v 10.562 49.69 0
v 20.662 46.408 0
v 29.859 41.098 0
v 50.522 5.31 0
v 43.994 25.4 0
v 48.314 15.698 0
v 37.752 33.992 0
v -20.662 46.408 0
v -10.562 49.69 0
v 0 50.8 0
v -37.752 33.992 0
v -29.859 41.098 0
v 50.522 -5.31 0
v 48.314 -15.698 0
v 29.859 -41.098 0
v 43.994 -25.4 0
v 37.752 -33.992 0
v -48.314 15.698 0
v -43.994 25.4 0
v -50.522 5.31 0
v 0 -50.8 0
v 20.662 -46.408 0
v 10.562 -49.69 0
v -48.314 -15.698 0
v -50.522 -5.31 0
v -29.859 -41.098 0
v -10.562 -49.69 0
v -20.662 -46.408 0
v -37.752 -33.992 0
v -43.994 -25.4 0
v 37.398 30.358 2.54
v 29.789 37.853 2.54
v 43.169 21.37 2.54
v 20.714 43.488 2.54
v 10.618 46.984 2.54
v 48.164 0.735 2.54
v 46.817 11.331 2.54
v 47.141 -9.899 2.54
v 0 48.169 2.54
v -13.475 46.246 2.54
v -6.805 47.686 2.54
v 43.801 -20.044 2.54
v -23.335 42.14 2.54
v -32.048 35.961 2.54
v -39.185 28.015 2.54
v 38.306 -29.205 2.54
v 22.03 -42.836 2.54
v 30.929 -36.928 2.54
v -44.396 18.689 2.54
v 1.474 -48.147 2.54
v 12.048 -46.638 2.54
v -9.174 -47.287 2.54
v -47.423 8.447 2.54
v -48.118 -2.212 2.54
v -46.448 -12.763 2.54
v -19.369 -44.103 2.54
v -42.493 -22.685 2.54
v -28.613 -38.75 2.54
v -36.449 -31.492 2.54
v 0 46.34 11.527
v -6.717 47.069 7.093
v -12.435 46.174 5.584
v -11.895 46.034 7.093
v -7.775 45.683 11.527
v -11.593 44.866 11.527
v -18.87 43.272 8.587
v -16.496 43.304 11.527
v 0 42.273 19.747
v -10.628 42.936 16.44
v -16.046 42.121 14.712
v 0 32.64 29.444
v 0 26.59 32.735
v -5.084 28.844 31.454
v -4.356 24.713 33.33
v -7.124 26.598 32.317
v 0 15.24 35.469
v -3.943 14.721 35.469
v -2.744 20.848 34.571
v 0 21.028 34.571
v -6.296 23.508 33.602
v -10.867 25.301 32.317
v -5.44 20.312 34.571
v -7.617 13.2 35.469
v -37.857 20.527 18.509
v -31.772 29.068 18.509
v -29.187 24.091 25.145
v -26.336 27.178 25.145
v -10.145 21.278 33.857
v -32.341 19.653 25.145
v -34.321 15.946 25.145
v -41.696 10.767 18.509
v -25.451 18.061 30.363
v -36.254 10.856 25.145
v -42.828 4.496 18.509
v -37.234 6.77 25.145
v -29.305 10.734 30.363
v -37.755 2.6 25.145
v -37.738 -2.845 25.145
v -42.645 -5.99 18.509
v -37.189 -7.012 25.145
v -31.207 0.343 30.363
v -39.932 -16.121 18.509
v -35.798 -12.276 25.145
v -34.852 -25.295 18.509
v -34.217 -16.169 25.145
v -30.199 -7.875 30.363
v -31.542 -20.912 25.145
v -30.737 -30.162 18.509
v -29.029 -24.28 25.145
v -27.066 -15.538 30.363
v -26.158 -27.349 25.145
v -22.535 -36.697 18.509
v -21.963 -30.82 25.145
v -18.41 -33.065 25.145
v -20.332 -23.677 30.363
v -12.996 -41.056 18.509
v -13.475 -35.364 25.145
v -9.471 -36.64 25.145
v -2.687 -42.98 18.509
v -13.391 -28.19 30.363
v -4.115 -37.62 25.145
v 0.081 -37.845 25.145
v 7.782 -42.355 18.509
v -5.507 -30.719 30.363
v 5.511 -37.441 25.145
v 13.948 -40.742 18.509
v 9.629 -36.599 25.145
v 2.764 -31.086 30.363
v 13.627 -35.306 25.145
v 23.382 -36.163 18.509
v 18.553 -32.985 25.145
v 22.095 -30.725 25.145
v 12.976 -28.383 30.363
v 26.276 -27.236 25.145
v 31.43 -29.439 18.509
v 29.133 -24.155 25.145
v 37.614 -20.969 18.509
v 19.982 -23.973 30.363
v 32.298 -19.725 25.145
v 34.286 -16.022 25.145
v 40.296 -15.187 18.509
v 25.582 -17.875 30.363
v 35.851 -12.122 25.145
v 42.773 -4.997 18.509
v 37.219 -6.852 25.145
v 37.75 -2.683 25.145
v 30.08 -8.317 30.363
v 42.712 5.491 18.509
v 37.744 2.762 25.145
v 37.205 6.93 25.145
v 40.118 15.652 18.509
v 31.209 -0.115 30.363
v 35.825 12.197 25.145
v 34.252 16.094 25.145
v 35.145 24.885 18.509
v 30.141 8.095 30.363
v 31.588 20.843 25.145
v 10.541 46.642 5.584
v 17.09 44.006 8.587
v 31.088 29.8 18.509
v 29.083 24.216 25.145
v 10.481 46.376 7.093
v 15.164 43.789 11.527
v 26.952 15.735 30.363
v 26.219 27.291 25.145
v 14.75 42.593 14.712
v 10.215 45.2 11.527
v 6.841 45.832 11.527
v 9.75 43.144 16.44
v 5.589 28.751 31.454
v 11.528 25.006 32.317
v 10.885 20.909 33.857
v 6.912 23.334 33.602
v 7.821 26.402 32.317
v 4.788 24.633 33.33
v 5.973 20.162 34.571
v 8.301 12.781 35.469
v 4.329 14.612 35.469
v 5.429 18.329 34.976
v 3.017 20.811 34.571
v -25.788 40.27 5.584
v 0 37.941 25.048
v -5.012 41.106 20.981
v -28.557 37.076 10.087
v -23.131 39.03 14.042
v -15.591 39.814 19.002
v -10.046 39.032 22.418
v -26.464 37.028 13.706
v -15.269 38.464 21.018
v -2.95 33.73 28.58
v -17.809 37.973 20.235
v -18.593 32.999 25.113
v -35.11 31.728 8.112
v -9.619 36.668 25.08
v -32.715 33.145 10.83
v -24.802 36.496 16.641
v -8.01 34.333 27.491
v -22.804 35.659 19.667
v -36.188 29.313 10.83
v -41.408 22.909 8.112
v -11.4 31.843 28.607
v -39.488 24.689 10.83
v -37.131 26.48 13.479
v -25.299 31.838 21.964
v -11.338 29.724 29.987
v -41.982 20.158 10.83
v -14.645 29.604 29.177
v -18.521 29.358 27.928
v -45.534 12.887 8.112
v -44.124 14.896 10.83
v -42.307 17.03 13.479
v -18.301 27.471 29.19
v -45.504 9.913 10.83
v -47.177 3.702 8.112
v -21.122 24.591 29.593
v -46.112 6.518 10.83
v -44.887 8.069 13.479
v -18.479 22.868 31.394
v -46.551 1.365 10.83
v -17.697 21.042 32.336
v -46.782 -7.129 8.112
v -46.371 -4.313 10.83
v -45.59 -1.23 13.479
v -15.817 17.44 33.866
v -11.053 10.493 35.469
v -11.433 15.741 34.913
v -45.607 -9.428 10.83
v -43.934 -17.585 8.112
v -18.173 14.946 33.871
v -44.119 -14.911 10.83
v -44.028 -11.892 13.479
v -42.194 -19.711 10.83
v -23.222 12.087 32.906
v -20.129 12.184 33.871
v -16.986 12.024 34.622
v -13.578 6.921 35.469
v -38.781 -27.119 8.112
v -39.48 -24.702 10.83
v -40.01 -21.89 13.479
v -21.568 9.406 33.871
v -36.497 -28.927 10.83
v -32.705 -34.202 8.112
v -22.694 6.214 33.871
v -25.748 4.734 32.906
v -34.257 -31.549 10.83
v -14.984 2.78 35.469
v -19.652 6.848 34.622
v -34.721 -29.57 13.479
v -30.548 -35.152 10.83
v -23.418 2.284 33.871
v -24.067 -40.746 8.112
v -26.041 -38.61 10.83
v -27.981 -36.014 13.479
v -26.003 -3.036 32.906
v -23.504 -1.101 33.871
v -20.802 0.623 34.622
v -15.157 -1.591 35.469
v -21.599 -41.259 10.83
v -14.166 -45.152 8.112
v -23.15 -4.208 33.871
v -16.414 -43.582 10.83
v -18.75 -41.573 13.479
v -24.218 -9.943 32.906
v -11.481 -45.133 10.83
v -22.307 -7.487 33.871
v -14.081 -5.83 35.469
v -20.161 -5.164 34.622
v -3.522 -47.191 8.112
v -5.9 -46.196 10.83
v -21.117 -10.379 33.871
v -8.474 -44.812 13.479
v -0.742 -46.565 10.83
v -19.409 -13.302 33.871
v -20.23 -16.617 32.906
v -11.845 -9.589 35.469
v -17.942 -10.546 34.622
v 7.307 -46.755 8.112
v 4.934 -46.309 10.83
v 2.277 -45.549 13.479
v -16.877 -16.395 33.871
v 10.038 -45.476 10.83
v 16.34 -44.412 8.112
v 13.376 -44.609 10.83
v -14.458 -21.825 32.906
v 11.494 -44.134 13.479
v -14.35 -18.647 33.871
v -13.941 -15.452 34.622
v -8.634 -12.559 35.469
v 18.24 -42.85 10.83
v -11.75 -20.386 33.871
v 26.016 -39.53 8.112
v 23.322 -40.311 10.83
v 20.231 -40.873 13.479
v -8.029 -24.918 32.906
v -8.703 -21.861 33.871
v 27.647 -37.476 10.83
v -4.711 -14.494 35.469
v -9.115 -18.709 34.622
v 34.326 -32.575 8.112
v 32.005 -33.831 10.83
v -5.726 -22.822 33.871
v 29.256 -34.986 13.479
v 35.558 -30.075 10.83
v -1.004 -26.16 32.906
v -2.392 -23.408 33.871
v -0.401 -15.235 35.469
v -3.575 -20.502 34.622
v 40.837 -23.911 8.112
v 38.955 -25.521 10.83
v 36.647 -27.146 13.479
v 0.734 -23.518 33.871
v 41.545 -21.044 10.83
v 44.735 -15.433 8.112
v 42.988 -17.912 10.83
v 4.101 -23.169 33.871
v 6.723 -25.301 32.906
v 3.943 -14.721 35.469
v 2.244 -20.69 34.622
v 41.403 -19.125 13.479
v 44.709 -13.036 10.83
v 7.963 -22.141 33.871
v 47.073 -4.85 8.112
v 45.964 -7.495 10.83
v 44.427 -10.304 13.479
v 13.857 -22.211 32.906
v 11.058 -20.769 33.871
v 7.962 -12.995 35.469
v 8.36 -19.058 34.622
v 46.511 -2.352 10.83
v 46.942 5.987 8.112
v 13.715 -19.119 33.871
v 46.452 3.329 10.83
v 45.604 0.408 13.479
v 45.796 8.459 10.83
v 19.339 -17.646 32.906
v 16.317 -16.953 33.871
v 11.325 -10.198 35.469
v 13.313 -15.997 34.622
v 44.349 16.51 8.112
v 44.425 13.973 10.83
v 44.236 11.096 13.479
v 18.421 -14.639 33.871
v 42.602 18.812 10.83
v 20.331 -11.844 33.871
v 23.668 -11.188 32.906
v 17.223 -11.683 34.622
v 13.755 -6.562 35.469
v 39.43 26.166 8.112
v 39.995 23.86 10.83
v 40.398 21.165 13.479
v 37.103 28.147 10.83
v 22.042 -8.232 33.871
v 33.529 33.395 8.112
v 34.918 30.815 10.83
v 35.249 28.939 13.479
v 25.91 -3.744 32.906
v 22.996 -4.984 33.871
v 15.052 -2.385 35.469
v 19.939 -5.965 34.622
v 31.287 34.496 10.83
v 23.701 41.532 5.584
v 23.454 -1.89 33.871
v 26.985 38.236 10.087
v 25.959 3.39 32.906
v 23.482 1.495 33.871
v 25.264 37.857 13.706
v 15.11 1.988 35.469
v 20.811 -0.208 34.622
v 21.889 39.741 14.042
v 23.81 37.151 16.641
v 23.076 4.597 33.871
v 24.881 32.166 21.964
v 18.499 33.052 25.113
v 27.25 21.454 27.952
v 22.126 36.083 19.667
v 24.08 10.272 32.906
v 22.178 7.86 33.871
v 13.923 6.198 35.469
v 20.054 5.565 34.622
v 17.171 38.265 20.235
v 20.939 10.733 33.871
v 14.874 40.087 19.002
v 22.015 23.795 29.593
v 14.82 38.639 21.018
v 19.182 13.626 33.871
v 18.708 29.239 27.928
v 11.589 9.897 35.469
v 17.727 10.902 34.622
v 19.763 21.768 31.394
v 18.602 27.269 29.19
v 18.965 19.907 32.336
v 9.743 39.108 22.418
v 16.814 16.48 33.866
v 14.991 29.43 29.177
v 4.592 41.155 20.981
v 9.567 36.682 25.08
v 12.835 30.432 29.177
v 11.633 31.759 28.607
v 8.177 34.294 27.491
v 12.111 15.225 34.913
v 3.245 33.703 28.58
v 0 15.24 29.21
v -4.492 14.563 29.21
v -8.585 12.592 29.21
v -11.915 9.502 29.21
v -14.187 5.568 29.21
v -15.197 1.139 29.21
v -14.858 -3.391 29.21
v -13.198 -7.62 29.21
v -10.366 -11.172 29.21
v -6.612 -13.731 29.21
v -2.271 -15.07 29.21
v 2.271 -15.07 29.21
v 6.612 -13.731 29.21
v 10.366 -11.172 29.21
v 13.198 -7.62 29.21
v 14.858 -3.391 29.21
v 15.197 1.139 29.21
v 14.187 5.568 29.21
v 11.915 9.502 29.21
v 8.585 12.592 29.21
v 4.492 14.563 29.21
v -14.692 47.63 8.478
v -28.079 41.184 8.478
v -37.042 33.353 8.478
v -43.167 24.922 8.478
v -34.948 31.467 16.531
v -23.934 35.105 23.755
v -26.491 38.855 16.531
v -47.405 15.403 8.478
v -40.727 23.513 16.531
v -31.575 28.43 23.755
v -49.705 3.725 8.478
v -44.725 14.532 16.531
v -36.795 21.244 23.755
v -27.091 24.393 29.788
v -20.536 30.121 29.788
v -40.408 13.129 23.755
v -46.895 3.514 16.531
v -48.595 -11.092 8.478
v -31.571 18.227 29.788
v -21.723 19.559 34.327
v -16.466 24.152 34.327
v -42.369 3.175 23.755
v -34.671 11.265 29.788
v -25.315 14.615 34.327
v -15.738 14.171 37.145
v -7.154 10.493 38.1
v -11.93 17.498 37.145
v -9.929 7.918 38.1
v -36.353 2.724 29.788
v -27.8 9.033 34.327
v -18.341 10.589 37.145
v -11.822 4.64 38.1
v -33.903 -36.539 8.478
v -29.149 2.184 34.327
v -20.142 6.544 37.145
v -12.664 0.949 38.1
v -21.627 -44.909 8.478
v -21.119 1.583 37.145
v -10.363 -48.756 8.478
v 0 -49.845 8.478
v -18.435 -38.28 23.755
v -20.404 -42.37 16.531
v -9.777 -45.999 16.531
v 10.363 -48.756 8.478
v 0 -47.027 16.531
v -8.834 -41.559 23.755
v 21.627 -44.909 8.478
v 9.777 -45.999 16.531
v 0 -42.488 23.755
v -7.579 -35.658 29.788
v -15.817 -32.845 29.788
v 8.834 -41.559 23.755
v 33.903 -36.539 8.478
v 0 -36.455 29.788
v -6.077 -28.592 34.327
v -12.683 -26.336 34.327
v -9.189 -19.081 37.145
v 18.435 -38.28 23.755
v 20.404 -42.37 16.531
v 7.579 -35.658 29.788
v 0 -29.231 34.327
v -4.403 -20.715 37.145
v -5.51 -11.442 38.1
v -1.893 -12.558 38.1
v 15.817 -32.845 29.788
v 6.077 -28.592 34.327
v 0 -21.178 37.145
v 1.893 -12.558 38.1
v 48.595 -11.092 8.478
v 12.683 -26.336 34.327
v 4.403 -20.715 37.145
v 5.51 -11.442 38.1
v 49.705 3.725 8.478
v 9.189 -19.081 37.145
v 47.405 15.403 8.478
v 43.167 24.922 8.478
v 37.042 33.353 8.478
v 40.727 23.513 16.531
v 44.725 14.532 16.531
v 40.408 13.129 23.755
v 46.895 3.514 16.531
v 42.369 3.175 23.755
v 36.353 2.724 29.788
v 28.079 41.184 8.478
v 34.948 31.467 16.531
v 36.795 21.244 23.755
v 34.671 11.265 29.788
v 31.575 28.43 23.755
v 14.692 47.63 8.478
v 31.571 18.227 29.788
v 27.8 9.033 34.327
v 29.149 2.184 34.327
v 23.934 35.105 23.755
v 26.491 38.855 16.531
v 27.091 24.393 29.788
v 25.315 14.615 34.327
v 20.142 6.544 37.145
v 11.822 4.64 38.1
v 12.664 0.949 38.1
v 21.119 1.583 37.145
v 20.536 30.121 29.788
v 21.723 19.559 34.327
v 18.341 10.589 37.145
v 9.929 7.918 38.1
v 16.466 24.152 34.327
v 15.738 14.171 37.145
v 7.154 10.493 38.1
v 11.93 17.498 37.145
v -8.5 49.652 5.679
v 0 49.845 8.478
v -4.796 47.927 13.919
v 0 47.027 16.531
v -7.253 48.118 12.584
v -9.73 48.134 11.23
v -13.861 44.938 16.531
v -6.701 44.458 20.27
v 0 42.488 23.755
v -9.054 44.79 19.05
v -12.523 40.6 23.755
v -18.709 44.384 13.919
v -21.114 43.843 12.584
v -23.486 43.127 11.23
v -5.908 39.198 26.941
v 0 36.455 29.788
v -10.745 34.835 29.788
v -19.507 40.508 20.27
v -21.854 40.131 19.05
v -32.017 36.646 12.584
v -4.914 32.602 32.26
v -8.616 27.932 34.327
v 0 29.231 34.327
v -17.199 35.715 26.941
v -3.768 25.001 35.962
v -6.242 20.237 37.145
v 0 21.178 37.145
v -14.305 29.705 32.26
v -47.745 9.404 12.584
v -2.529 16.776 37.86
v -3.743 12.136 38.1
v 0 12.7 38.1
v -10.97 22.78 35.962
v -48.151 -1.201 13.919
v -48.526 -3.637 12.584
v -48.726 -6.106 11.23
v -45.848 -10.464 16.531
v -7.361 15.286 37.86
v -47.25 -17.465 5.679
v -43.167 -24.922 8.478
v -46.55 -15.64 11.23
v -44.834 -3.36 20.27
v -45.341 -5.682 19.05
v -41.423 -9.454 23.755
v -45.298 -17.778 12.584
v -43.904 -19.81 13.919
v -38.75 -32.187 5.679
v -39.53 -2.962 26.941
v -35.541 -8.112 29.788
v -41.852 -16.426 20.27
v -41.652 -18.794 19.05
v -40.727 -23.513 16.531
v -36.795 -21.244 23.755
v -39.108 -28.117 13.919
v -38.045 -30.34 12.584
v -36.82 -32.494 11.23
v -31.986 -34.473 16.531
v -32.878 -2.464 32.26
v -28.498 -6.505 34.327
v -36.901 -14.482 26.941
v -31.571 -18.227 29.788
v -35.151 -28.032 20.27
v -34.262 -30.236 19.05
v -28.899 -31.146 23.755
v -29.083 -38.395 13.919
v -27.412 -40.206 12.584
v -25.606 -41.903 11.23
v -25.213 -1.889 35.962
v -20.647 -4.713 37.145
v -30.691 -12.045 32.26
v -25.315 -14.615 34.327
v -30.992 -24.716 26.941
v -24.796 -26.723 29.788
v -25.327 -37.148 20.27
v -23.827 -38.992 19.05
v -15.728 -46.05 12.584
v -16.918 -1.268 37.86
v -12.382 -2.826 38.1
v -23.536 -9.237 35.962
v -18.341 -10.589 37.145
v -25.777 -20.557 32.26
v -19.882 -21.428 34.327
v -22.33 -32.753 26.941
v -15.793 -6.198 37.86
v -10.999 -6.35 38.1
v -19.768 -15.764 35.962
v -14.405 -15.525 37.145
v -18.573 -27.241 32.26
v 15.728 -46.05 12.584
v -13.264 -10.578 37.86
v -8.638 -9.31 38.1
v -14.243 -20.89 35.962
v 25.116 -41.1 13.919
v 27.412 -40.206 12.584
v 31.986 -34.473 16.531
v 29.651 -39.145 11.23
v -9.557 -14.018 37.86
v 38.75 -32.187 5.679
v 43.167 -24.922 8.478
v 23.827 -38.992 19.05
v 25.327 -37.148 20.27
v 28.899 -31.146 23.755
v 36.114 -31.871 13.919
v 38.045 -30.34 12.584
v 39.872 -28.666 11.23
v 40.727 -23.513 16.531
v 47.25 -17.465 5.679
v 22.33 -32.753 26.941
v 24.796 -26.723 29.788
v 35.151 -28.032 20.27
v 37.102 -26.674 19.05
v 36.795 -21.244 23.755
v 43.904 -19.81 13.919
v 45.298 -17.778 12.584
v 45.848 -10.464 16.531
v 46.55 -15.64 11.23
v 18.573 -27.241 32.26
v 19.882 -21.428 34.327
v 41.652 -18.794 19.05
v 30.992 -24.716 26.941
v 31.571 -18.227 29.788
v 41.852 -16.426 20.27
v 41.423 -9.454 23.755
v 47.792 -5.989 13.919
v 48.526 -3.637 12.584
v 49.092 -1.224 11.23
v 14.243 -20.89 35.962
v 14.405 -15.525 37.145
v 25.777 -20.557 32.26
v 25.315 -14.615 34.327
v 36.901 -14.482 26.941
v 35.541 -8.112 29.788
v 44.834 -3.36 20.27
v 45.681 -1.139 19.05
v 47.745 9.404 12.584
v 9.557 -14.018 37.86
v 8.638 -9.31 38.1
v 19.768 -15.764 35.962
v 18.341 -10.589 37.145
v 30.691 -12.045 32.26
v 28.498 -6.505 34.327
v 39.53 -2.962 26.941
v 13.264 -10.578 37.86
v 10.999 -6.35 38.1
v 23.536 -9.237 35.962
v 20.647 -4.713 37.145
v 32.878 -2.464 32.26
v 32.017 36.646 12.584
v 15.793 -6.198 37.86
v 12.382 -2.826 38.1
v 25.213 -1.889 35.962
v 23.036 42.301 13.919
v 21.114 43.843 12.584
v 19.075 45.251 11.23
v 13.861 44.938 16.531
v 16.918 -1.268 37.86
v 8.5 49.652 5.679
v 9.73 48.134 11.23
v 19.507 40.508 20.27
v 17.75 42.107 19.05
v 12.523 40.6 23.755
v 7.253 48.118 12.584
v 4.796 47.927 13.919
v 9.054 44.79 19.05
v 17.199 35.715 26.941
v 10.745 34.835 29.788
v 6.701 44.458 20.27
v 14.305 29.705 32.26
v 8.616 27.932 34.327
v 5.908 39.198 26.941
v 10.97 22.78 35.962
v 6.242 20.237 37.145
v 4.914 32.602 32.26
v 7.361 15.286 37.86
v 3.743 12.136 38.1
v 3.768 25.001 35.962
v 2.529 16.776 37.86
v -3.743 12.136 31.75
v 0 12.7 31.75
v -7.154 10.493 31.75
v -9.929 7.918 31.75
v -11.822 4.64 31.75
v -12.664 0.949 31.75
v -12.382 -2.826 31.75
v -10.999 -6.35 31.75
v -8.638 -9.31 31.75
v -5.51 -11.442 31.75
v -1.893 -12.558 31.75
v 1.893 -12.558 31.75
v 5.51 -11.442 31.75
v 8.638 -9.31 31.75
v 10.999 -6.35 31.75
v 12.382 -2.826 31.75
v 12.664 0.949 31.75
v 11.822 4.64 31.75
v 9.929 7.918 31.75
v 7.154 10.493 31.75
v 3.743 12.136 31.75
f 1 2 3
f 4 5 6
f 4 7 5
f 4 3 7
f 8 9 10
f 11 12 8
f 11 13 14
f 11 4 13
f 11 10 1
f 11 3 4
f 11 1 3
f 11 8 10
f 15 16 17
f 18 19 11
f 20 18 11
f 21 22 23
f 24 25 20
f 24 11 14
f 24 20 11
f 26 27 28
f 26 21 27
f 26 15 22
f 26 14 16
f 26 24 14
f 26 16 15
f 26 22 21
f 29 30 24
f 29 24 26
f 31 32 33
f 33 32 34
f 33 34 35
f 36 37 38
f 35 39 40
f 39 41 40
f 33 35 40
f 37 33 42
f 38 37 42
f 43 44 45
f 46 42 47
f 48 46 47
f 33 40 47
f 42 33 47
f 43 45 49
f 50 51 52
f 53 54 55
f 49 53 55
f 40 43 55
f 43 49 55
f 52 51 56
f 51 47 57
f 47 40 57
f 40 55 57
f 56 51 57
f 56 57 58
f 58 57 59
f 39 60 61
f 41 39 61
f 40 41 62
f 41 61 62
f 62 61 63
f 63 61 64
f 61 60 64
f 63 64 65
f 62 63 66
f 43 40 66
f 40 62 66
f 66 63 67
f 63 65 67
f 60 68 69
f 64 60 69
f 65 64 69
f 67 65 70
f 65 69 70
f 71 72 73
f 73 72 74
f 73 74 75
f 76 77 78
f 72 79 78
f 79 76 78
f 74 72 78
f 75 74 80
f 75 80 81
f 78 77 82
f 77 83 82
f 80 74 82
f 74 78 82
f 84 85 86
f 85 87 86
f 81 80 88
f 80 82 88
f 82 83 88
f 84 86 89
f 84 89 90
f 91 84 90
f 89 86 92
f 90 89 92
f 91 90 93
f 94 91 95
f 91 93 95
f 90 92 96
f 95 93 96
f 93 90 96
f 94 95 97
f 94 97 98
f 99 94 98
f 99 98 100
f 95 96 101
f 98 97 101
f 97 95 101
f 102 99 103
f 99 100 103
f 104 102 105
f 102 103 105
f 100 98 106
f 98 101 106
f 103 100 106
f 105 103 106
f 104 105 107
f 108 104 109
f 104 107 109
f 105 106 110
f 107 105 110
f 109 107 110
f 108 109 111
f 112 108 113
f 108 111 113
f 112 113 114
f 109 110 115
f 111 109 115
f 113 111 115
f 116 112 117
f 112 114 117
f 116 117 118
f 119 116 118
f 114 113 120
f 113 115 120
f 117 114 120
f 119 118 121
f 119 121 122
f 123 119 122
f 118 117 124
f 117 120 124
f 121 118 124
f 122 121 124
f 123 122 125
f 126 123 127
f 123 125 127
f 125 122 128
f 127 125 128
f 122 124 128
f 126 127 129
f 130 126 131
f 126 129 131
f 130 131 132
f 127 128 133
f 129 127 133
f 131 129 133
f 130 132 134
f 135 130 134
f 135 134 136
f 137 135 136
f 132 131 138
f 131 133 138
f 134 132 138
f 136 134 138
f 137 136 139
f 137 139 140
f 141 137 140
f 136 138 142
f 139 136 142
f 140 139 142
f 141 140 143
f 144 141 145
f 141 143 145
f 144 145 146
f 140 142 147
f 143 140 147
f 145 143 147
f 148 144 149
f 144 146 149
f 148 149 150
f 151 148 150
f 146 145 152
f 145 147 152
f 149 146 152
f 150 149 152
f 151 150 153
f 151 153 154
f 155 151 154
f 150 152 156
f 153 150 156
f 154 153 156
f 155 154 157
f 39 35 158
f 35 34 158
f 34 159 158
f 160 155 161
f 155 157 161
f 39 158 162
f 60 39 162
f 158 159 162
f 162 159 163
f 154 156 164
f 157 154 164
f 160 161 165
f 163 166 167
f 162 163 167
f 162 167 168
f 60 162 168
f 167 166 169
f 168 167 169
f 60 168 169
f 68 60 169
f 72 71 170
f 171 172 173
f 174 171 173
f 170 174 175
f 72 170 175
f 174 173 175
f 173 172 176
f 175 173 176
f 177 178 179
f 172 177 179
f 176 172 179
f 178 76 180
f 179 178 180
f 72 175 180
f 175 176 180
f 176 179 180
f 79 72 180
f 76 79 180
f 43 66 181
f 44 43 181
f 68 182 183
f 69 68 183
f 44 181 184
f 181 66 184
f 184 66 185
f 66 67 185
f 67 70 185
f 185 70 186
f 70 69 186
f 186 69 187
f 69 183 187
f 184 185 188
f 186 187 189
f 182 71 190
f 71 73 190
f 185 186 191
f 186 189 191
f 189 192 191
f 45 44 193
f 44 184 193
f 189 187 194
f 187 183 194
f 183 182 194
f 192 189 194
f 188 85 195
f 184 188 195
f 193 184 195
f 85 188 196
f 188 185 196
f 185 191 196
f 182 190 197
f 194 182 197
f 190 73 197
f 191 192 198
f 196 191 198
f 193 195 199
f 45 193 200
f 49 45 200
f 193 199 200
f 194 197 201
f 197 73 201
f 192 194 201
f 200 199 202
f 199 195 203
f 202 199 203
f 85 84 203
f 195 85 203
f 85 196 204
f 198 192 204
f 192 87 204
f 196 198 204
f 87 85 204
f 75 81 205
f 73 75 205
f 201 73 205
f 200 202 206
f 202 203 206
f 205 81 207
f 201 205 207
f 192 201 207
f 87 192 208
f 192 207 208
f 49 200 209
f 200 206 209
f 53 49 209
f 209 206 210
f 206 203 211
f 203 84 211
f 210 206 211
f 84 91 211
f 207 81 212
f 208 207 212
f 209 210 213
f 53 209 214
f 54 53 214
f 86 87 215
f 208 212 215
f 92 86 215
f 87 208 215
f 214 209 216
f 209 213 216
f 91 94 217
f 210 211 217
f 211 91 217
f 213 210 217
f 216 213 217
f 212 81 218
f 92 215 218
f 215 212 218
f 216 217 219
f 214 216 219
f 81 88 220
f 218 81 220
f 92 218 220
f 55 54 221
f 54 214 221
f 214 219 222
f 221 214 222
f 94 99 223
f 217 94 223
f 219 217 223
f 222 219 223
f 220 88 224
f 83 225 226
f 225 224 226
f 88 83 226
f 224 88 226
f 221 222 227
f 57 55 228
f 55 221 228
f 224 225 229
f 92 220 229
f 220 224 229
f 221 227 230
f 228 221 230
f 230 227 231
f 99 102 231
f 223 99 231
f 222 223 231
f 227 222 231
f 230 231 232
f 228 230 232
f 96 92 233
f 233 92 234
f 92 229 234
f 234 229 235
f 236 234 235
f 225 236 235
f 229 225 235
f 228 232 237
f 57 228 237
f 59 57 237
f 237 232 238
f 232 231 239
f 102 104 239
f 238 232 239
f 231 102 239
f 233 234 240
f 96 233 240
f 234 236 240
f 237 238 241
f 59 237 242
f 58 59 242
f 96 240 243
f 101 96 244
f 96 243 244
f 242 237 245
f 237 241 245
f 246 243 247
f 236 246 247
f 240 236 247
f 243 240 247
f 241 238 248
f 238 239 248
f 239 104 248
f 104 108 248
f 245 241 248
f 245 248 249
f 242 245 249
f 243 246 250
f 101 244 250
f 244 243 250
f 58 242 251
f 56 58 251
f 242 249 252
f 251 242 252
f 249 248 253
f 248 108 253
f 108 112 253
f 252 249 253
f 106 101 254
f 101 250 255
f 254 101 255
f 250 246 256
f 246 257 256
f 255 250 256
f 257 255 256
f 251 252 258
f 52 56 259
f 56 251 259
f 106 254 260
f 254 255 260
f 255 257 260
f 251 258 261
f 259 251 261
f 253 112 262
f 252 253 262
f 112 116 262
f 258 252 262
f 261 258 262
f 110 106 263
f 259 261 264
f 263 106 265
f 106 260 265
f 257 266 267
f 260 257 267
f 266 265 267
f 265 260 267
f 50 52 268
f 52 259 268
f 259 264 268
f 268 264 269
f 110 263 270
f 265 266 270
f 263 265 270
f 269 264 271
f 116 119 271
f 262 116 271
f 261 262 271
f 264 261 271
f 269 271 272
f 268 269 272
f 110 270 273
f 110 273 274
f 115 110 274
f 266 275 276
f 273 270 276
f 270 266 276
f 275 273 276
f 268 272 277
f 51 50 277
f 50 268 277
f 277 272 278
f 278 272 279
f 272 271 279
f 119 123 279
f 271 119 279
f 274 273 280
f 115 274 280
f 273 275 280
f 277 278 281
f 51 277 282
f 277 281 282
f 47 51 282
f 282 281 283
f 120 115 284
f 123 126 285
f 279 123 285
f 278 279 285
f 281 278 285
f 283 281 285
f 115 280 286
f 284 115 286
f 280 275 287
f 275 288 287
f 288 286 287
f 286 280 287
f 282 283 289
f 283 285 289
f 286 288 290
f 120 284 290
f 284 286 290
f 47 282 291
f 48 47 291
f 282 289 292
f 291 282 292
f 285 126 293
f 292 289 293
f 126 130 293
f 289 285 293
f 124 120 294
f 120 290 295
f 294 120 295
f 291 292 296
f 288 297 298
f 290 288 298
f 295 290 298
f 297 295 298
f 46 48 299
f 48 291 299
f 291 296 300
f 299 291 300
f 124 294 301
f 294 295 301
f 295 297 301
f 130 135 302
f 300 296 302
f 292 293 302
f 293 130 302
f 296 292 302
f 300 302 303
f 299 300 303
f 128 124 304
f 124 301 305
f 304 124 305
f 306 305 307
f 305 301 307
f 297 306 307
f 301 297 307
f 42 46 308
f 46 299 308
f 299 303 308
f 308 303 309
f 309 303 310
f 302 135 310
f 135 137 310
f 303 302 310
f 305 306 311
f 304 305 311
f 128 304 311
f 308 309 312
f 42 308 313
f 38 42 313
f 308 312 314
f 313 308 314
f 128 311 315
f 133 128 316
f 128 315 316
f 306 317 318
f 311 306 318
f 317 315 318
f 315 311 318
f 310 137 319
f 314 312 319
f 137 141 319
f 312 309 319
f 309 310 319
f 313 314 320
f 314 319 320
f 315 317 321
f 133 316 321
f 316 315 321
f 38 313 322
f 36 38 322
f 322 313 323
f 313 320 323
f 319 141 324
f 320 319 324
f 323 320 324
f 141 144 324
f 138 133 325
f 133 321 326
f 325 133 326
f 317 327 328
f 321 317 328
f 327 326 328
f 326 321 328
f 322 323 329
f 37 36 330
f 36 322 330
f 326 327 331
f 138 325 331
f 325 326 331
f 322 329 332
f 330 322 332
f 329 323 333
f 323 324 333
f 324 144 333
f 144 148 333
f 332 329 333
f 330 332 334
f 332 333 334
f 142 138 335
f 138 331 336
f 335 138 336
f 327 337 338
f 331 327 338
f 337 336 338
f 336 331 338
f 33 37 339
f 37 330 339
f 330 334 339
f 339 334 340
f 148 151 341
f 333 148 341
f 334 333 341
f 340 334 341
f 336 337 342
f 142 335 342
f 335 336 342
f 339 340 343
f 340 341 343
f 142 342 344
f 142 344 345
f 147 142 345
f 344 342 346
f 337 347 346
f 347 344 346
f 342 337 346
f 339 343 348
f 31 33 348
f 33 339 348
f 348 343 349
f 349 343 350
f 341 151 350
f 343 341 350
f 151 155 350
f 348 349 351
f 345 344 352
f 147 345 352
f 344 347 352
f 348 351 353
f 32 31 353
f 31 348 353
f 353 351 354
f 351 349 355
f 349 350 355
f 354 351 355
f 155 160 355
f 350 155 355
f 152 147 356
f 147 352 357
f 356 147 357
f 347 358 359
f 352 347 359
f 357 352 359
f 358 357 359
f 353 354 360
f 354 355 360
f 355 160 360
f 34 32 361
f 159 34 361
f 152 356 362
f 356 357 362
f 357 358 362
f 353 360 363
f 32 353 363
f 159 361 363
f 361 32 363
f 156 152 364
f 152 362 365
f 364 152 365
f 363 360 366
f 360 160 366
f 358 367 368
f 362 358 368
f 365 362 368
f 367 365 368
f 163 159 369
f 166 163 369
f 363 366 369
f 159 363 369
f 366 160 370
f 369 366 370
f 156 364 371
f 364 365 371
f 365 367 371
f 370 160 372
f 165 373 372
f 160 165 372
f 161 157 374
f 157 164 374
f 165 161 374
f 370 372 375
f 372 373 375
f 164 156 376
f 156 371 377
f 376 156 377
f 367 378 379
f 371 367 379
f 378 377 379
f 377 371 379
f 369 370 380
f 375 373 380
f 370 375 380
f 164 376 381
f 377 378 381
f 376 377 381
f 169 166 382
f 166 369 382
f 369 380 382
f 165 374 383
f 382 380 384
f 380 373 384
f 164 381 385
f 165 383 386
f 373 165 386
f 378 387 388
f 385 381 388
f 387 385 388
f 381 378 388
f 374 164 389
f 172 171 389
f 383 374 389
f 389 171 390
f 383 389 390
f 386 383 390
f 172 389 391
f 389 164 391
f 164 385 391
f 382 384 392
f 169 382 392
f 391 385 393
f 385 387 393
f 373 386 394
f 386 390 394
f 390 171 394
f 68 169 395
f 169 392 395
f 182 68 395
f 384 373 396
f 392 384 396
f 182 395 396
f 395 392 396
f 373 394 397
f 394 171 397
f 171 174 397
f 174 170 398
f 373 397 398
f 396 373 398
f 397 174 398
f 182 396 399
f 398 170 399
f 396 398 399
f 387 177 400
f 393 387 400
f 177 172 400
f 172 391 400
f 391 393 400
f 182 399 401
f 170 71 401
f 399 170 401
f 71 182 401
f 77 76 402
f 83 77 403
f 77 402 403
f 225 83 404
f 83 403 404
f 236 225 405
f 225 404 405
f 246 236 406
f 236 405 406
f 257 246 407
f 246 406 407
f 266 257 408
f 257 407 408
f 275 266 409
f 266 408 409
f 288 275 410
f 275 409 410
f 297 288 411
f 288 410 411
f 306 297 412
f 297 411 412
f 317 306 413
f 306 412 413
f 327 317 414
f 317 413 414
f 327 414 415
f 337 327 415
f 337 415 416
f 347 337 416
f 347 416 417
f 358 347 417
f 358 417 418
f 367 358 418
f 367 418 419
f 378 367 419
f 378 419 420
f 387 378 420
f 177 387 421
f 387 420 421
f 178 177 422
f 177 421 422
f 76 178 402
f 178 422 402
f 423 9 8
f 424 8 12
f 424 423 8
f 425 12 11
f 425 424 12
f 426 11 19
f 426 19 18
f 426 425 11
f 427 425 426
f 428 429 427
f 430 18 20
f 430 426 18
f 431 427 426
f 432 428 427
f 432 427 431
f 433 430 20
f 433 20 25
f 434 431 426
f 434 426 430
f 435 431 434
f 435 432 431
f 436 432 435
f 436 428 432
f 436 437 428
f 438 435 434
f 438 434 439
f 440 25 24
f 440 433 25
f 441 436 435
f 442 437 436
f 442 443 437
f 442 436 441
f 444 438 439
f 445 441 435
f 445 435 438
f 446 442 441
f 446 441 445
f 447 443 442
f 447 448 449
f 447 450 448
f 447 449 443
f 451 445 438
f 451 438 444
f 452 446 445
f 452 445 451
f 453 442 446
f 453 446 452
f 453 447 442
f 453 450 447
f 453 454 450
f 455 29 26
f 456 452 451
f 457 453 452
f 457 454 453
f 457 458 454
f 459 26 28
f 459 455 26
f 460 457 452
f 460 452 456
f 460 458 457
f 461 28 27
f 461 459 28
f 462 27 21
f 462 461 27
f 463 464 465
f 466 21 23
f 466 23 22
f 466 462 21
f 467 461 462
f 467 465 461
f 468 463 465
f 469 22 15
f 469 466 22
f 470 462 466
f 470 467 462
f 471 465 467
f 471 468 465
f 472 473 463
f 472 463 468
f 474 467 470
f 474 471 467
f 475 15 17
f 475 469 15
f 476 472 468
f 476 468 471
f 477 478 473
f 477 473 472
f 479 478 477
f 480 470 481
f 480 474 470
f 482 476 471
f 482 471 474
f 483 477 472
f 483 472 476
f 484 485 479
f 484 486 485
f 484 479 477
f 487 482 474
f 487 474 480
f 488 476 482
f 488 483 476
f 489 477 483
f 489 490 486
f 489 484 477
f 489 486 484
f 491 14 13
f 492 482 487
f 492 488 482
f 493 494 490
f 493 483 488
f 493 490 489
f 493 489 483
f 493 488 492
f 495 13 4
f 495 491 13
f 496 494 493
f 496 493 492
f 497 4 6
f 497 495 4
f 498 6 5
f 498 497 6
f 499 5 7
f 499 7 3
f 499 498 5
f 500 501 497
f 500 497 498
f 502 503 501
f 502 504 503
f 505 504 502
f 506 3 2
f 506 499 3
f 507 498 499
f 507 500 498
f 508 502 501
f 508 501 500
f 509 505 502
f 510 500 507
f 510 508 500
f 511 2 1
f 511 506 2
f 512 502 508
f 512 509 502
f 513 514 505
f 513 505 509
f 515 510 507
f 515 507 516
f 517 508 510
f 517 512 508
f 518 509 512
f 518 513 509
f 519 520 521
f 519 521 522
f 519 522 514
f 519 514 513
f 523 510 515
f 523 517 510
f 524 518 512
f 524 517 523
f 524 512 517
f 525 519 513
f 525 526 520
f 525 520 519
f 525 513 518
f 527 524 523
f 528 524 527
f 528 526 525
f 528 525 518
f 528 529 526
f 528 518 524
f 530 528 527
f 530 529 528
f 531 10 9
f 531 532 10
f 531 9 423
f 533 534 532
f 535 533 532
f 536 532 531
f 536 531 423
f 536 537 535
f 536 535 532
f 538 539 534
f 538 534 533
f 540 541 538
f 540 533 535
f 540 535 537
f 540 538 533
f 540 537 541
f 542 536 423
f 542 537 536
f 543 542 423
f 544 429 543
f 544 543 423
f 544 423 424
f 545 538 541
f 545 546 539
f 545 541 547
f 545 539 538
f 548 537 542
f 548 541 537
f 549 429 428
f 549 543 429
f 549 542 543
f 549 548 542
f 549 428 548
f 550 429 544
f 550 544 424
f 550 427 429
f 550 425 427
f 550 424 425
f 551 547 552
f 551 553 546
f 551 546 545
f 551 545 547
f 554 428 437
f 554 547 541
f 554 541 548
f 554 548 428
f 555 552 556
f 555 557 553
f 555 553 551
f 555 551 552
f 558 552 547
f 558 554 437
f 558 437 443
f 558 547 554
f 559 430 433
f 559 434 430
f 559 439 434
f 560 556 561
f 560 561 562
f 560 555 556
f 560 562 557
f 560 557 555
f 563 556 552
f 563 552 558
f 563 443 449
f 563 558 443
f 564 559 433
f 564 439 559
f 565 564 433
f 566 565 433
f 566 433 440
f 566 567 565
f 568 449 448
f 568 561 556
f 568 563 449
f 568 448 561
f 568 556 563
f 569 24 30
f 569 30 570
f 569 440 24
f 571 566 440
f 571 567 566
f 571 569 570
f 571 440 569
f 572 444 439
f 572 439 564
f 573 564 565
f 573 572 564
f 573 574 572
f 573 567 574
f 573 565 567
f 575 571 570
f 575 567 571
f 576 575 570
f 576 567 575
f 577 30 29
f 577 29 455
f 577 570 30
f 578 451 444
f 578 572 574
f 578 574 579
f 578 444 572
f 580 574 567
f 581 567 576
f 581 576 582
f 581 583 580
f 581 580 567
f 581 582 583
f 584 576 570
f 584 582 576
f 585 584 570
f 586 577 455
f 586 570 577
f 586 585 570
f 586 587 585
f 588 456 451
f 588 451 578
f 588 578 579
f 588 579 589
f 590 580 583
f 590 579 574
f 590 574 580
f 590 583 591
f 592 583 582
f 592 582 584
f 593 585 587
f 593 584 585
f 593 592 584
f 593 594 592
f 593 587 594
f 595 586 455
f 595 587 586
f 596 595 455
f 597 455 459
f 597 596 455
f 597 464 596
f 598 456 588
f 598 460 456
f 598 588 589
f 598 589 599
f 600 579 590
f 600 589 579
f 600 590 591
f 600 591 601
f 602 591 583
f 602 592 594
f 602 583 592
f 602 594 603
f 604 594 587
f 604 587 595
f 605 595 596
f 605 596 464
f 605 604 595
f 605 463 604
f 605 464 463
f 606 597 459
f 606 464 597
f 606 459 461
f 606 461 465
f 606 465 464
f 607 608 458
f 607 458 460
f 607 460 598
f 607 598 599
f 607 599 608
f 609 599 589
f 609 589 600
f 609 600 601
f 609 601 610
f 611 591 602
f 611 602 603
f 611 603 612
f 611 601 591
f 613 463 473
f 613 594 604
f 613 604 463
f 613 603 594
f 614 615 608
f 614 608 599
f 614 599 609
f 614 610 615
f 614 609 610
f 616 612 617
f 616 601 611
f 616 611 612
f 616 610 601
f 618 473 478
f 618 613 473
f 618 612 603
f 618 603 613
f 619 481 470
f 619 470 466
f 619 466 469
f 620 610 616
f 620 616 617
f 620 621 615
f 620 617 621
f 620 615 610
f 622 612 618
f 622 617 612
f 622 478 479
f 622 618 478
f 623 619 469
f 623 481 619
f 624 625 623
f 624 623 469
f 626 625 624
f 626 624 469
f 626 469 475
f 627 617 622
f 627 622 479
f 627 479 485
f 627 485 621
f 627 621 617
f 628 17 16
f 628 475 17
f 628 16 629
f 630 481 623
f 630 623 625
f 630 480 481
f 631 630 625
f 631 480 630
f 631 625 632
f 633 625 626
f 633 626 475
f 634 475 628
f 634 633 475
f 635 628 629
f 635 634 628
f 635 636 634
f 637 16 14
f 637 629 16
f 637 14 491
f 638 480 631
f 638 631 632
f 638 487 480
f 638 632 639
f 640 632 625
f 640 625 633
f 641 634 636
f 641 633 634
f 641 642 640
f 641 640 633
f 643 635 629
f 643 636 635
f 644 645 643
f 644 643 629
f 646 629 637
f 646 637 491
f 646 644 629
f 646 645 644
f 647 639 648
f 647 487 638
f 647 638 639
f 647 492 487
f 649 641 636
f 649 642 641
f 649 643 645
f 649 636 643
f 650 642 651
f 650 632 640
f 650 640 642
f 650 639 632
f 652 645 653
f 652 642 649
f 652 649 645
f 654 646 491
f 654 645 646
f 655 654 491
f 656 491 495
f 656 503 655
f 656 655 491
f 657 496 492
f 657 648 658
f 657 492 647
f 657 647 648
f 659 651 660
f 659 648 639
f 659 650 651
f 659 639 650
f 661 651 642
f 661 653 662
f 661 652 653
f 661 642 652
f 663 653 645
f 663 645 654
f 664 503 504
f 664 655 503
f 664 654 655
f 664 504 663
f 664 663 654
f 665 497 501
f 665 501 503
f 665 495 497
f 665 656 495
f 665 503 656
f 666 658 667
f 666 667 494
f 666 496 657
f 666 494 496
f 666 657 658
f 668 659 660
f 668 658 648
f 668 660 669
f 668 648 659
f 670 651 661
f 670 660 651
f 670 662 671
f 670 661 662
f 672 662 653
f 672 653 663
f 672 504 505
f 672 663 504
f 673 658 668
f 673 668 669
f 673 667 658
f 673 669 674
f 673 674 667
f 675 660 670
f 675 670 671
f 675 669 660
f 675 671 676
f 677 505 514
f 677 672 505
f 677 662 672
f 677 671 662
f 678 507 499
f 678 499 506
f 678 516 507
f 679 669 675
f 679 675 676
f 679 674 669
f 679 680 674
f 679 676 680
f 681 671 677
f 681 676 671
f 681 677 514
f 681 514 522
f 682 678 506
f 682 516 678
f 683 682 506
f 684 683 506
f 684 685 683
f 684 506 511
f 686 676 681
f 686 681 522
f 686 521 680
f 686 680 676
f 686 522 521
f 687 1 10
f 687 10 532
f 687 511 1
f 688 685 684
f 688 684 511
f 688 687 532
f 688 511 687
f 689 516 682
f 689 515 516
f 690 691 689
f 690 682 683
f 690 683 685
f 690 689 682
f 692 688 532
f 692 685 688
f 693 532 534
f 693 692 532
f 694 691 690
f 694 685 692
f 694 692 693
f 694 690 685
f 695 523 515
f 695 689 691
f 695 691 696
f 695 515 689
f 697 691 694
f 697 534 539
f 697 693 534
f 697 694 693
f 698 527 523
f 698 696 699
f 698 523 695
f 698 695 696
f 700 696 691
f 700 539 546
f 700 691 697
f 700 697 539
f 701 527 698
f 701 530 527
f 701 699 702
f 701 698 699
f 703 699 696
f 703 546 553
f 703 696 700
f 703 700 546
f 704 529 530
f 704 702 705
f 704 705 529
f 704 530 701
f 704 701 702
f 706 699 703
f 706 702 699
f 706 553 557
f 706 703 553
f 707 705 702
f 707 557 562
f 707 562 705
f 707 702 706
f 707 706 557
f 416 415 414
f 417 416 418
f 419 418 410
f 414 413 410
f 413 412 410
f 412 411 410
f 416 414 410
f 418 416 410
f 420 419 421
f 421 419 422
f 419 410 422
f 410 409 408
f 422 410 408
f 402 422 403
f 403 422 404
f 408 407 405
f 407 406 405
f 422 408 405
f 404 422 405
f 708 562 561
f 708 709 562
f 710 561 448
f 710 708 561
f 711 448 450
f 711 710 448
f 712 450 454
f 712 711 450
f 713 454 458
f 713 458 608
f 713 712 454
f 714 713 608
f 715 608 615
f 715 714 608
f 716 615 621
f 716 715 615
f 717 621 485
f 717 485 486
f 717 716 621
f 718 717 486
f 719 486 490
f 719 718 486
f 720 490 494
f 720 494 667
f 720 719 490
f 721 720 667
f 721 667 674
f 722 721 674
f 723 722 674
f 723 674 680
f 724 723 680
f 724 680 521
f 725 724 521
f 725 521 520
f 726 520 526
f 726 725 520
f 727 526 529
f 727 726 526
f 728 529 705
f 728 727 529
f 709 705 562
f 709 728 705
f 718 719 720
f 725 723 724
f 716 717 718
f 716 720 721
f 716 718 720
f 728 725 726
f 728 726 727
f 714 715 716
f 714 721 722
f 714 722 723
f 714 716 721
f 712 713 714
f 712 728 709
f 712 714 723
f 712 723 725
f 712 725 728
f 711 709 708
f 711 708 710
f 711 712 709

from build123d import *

# Parameters (mm, degrees)
F2_T = -2.54


with BuildPart() as f1:
    # F0 (on Right) → F1 (revolve)
    with BuildSketch(Plane.YZ):
        with BuildLine():
            Line((0, 31.75), (0, 0))
            Line((0, 0), (50.8, 0))
            ThreePointArc((50.8, 0), (39.6407683632, 26.9407683632), (12.7, 38.1))
            Line((12.7, 38.1), (12.7, 31.75))
            Line((12.7, 31.75), (0, 31.75))
        make_face()
    revolve(axis=Axis((0, 0, 19.05), (0, 0, 1)))

    # F2 (hollow: no face is removed)
    offset(amount=F2_T, kind=Kind.INTERSECTION, mode=Mode.SUBTRACT)


solid = f1.part
